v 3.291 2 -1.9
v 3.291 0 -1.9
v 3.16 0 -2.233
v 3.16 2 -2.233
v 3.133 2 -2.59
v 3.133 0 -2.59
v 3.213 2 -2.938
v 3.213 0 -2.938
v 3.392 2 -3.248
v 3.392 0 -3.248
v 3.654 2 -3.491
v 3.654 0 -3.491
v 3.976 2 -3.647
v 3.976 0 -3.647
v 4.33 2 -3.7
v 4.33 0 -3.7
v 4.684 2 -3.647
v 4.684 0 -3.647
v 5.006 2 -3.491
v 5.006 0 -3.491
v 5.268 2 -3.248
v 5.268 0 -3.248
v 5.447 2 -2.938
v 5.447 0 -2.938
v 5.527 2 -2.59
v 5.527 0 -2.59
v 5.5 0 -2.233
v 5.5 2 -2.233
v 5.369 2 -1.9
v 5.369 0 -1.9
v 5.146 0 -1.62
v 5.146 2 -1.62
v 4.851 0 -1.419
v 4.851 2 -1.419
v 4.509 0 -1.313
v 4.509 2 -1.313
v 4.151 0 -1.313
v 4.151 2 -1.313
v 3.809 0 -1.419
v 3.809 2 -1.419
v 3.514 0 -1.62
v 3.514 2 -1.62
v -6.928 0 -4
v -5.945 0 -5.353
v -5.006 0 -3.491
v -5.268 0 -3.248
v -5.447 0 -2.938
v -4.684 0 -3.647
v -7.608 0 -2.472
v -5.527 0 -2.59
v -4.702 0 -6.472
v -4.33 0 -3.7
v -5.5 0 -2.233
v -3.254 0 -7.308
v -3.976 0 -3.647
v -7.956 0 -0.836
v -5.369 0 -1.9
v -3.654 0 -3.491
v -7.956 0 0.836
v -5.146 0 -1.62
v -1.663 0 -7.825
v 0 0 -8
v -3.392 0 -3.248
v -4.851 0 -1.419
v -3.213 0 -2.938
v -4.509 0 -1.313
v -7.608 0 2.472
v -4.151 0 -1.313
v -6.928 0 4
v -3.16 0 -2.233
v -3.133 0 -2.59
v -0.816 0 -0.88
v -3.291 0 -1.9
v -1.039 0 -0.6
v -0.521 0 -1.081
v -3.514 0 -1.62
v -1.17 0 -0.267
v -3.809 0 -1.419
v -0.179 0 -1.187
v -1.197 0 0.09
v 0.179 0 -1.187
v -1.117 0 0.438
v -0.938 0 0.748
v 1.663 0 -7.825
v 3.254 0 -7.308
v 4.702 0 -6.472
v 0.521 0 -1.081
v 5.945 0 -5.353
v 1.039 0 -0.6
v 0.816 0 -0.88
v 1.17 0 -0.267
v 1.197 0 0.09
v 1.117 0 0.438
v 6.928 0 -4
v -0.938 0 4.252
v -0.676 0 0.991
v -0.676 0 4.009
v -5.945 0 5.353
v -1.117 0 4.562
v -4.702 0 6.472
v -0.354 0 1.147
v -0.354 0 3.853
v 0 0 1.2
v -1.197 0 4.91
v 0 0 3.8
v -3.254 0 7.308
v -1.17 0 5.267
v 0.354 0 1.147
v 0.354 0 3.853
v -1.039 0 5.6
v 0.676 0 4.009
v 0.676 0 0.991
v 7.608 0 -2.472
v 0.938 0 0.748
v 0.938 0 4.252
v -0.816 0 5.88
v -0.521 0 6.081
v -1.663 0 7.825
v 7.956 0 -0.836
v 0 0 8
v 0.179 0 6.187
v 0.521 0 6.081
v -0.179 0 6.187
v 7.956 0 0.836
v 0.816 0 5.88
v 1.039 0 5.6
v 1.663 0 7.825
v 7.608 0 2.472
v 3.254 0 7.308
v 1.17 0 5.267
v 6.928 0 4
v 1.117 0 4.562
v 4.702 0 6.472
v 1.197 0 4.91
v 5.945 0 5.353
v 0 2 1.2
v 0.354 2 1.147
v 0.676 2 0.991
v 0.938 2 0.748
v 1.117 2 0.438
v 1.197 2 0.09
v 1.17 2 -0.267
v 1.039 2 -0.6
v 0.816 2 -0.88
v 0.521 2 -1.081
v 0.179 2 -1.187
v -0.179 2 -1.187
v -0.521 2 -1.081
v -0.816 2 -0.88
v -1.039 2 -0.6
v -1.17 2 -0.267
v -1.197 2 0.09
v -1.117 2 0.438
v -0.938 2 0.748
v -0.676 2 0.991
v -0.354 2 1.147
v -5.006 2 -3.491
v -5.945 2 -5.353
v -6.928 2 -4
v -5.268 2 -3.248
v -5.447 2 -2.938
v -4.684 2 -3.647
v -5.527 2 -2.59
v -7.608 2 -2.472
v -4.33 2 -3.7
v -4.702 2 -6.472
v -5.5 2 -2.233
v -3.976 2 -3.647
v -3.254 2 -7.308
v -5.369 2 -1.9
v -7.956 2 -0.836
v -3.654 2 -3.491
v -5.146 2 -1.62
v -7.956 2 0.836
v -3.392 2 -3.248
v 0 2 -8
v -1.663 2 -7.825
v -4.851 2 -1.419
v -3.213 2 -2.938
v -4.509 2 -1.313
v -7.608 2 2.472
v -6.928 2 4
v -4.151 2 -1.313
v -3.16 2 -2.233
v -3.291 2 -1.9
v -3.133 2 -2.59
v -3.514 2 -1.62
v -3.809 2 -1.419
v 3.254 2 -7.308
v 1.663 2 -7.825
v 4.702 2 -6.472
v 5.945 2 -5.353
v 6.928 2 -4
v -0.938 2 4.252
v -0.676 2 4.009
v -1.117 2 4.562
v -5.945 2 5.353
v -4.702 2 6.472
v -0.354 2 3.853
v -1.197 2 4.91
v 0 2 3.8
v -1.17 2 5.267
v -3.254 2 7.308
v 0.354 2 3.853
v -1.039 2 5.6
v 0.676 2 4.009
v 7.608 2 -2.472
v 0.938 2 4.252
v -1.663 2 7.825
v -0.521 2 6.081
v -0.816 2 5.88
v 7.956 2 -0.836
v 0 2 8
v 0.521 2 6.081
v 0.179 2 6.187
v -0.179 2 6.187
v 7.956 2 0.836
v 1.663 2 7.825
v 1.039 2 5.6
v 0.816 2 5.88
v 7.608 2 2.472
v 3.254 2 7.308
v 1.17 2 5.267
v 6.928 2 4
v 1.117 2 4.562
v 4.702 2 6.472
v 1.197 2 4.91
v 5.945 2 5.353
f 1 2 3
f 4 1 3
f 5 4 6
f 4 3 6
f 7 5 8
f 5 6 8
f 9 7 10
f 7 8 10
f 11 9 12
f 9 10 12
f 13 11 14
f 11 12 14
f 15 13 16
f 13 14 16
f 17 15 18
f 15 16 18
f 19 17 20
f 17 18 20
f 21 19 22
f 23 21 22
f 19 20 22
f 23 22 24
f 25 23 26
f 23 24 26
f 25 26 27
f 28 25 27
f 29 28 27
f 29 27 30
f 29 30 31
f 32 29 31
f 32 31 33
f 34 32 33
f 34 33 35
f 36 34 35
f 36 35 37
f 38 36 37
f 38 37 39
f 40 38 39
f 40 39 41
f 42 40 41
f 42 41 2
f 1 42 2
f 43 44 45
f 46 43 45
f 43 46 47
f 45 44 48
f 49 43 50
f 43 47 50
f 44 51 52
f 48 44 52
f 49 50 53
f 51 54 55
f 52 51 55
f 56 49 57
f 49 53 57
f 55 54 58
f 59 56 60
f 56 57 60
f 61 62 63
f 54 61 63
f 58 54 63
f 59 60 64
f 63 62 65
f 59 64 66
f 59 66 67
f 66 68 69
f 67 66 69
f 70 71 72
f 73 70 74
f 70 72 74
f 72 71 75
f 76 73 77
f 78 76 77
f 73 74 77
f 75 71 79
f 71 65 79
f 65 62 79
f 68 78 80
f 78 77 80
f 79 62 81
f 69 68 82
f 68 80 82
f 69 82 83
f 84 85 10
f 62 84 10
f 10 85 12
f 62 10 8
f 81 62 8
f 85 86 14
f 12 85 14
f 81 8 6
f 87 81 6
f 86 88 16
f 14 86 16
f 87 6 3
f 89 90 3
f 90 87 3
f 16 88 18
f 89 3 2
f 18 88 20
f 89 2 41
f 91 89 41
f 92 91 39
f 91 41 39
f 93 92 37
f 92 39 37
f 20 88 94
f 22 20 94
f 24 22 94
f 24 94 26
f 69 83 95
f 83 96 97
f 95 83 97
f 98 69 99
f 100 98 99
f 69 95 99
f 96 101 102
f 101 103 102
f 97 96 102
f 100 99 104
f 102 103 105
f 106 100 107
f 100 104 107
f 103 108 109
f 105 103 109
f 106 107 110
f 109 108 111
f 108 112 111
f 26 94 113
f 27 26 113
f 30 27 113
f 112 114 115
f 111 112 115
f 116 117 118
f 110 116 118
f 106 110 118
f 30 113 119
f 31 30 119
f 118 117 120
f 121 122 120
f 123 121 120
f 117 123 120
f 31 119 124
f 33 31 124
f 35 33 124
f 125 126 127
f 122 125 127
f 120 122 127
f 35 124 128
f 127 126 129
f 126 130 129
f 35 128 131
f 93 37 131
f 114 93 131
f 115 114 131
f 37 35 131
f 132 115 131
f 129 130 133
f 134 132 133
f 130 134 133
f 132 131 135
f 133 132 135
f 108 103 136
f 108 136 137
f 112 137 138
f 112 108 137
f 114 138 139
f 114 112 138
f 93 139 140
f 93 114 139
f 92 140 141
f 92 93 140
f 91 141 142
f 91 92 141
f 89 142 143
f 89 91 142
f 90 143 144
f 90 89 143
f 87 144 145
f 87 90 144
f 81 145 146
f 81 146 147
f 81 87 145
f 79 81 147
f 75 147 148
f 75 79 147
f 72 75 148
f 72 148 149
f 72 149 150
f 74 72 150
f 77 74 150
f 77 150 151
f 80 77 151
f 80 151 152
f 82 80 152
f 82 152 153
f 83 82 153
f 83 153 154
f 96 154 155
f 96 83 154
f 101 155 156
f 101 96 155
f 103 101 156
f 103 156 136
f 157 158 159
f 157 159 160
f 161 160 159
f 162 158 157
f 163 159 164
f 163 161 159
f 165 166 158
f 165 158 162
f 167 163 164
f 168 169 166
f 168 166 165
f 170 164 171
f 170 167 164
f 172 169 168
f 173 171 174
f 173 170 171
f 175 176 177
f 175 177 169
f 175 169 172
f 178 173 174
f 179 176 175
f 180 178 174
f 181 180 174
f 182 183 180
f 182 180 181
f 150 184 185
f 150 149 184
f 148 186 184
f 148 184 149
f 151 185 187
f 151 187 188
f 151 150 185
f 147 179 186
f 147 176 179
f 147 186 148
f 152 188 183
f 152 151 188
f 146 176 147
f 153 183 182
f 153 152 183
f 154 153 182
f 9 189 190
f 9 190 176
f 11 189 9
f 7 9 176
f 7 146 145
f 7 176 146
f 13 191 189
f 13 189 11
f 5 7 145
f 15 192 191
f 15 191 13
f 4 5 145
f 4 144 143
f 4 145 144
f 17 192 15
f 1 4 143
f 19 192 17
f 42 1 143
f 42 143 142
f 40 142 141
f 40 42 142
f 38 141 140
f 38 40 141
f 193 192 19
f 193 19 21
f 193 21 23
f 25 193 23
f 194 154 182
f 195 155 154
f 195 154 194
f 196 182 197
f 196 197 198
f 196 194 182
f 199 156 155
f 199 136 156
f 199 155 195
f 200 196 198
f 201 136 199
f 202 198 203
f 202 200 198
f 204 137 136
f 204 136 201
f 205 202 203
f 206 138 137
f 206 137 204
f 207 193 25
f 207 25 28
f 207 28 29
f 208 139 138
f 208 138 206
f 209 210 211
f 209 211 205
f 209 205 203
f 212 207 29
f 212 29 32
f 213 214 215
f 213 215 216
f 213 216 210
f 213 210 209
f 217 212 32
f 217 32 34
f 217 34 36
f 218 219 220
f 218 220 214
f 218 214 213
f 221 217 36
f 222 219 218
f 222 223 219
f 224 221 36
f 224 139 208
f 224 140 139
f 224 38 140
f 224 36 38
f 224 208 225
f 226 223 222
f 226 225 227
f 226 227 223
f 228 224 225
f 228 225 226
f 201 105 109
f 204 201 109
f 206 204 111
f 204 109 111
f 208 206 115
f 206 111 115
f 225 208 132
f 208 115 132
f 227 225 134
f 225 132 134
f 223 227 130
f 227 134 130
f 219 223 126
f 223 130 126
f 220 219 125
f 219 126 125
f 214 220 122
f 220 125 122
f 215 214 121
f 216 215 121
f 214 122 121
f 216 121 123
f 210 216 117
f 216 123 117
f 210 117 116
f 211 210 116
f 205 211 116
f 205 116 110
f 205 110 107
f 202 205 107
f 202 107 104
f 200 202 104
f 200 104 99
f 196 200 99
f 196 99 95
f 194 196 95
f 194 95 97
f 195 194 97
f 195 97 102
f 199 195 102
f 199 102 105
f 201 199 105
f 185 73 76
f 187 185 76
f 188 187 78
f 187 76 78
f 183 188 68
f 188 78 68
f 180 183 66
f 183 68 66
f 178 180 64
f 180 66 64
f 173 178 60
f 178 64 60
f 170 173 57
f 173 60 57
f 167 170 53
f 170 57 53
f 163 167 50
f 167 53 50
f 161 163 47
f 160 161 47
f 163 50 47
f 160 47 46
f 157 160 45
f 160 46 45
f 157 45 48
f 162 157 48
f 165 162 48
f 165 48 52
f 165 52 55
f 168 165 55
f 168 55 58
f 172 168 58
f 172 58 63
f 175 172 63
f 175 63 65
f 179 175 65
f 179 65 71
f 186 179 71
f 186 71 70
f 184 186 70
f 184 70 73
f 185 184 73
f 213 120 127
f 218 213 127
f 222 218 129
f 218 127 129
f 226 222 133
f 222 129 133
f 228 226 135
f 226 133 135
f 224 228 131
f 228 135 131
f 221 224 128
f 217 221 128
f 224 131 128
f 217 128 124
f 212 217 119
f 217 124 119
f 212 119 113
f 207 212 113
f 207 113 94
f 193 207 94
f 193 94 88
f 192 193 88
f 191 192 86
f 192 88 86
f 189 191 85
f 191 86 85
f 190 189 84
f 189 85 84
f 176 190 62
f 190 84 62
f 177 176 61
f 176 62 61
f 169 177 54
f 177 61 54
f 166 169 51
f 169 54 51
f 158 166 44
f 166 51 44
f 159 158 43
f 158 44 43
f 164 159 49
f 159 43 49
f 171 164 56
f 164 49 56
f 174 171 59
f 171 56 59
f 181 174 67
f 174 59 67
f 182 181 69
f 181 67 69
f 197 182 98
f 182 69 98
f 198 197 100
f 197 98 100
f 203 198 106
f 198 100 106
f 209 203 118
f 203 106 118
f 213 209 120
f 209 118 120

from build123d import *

# Parameters (mm, degrees)
SKETCH_4_R               = 8
SKETCH_4_R_2             = 1.2
EXTRUDE_1_DEPTH          = 2
SKETCH_5_R               = 1.2
CUT_EXTRUDE_1_DEPTH      = 12.489125293
PATTERN_CIRCULAR_1_COUNT = 3


with BuildPart() as part:
    # 草图4 → 凸台-拉伸1 (new body)
    with BuildSketch(Plane(origin=(0, 0, 0), x_dir=(1, 0, 0), z_dir=(0, 1, 0))):
        with Locations(Location((0, 0, 0), (0, 0, 270))):
            Circle(SKETCH_4_R)
        with Locations(Location((0, 0, 0), (0, 0, 270))):
            Circle(SKETCH_4_R_2, mode=Mode.SUBTRACT)
    extrude(amount=EXTRUDE_1_DEPTH)

    # 草图5 → 切除-拉伸1 (cut, through all)
    with BuildSketch(Plane.XZ):
        with Locations(Location((0, 5, 0), (0, 0, 270))):
            Circle(SKETCH_5_R)
    cut_extrude_1 = extrude(amount=-CUT_EXTRUDE_1_DEPTH, mode=Mode.SUBTRACT)

    # 阵列(圆周)1: 切除-拉伸1 ×3 about axis
    pattern_circular_1_axis = Axis((0, 0, 0), (0, 1, 0))
    for i in range(1, PATTERN_CIRCULAR_1_COUNT):
        add(cut_extrude_1.rotate(pattern_circular_1_axis, i * 360 / PATTERN_CIRCULAR_1_COUNT), mode=Mode.SUBTRACT)


solid = part.part
